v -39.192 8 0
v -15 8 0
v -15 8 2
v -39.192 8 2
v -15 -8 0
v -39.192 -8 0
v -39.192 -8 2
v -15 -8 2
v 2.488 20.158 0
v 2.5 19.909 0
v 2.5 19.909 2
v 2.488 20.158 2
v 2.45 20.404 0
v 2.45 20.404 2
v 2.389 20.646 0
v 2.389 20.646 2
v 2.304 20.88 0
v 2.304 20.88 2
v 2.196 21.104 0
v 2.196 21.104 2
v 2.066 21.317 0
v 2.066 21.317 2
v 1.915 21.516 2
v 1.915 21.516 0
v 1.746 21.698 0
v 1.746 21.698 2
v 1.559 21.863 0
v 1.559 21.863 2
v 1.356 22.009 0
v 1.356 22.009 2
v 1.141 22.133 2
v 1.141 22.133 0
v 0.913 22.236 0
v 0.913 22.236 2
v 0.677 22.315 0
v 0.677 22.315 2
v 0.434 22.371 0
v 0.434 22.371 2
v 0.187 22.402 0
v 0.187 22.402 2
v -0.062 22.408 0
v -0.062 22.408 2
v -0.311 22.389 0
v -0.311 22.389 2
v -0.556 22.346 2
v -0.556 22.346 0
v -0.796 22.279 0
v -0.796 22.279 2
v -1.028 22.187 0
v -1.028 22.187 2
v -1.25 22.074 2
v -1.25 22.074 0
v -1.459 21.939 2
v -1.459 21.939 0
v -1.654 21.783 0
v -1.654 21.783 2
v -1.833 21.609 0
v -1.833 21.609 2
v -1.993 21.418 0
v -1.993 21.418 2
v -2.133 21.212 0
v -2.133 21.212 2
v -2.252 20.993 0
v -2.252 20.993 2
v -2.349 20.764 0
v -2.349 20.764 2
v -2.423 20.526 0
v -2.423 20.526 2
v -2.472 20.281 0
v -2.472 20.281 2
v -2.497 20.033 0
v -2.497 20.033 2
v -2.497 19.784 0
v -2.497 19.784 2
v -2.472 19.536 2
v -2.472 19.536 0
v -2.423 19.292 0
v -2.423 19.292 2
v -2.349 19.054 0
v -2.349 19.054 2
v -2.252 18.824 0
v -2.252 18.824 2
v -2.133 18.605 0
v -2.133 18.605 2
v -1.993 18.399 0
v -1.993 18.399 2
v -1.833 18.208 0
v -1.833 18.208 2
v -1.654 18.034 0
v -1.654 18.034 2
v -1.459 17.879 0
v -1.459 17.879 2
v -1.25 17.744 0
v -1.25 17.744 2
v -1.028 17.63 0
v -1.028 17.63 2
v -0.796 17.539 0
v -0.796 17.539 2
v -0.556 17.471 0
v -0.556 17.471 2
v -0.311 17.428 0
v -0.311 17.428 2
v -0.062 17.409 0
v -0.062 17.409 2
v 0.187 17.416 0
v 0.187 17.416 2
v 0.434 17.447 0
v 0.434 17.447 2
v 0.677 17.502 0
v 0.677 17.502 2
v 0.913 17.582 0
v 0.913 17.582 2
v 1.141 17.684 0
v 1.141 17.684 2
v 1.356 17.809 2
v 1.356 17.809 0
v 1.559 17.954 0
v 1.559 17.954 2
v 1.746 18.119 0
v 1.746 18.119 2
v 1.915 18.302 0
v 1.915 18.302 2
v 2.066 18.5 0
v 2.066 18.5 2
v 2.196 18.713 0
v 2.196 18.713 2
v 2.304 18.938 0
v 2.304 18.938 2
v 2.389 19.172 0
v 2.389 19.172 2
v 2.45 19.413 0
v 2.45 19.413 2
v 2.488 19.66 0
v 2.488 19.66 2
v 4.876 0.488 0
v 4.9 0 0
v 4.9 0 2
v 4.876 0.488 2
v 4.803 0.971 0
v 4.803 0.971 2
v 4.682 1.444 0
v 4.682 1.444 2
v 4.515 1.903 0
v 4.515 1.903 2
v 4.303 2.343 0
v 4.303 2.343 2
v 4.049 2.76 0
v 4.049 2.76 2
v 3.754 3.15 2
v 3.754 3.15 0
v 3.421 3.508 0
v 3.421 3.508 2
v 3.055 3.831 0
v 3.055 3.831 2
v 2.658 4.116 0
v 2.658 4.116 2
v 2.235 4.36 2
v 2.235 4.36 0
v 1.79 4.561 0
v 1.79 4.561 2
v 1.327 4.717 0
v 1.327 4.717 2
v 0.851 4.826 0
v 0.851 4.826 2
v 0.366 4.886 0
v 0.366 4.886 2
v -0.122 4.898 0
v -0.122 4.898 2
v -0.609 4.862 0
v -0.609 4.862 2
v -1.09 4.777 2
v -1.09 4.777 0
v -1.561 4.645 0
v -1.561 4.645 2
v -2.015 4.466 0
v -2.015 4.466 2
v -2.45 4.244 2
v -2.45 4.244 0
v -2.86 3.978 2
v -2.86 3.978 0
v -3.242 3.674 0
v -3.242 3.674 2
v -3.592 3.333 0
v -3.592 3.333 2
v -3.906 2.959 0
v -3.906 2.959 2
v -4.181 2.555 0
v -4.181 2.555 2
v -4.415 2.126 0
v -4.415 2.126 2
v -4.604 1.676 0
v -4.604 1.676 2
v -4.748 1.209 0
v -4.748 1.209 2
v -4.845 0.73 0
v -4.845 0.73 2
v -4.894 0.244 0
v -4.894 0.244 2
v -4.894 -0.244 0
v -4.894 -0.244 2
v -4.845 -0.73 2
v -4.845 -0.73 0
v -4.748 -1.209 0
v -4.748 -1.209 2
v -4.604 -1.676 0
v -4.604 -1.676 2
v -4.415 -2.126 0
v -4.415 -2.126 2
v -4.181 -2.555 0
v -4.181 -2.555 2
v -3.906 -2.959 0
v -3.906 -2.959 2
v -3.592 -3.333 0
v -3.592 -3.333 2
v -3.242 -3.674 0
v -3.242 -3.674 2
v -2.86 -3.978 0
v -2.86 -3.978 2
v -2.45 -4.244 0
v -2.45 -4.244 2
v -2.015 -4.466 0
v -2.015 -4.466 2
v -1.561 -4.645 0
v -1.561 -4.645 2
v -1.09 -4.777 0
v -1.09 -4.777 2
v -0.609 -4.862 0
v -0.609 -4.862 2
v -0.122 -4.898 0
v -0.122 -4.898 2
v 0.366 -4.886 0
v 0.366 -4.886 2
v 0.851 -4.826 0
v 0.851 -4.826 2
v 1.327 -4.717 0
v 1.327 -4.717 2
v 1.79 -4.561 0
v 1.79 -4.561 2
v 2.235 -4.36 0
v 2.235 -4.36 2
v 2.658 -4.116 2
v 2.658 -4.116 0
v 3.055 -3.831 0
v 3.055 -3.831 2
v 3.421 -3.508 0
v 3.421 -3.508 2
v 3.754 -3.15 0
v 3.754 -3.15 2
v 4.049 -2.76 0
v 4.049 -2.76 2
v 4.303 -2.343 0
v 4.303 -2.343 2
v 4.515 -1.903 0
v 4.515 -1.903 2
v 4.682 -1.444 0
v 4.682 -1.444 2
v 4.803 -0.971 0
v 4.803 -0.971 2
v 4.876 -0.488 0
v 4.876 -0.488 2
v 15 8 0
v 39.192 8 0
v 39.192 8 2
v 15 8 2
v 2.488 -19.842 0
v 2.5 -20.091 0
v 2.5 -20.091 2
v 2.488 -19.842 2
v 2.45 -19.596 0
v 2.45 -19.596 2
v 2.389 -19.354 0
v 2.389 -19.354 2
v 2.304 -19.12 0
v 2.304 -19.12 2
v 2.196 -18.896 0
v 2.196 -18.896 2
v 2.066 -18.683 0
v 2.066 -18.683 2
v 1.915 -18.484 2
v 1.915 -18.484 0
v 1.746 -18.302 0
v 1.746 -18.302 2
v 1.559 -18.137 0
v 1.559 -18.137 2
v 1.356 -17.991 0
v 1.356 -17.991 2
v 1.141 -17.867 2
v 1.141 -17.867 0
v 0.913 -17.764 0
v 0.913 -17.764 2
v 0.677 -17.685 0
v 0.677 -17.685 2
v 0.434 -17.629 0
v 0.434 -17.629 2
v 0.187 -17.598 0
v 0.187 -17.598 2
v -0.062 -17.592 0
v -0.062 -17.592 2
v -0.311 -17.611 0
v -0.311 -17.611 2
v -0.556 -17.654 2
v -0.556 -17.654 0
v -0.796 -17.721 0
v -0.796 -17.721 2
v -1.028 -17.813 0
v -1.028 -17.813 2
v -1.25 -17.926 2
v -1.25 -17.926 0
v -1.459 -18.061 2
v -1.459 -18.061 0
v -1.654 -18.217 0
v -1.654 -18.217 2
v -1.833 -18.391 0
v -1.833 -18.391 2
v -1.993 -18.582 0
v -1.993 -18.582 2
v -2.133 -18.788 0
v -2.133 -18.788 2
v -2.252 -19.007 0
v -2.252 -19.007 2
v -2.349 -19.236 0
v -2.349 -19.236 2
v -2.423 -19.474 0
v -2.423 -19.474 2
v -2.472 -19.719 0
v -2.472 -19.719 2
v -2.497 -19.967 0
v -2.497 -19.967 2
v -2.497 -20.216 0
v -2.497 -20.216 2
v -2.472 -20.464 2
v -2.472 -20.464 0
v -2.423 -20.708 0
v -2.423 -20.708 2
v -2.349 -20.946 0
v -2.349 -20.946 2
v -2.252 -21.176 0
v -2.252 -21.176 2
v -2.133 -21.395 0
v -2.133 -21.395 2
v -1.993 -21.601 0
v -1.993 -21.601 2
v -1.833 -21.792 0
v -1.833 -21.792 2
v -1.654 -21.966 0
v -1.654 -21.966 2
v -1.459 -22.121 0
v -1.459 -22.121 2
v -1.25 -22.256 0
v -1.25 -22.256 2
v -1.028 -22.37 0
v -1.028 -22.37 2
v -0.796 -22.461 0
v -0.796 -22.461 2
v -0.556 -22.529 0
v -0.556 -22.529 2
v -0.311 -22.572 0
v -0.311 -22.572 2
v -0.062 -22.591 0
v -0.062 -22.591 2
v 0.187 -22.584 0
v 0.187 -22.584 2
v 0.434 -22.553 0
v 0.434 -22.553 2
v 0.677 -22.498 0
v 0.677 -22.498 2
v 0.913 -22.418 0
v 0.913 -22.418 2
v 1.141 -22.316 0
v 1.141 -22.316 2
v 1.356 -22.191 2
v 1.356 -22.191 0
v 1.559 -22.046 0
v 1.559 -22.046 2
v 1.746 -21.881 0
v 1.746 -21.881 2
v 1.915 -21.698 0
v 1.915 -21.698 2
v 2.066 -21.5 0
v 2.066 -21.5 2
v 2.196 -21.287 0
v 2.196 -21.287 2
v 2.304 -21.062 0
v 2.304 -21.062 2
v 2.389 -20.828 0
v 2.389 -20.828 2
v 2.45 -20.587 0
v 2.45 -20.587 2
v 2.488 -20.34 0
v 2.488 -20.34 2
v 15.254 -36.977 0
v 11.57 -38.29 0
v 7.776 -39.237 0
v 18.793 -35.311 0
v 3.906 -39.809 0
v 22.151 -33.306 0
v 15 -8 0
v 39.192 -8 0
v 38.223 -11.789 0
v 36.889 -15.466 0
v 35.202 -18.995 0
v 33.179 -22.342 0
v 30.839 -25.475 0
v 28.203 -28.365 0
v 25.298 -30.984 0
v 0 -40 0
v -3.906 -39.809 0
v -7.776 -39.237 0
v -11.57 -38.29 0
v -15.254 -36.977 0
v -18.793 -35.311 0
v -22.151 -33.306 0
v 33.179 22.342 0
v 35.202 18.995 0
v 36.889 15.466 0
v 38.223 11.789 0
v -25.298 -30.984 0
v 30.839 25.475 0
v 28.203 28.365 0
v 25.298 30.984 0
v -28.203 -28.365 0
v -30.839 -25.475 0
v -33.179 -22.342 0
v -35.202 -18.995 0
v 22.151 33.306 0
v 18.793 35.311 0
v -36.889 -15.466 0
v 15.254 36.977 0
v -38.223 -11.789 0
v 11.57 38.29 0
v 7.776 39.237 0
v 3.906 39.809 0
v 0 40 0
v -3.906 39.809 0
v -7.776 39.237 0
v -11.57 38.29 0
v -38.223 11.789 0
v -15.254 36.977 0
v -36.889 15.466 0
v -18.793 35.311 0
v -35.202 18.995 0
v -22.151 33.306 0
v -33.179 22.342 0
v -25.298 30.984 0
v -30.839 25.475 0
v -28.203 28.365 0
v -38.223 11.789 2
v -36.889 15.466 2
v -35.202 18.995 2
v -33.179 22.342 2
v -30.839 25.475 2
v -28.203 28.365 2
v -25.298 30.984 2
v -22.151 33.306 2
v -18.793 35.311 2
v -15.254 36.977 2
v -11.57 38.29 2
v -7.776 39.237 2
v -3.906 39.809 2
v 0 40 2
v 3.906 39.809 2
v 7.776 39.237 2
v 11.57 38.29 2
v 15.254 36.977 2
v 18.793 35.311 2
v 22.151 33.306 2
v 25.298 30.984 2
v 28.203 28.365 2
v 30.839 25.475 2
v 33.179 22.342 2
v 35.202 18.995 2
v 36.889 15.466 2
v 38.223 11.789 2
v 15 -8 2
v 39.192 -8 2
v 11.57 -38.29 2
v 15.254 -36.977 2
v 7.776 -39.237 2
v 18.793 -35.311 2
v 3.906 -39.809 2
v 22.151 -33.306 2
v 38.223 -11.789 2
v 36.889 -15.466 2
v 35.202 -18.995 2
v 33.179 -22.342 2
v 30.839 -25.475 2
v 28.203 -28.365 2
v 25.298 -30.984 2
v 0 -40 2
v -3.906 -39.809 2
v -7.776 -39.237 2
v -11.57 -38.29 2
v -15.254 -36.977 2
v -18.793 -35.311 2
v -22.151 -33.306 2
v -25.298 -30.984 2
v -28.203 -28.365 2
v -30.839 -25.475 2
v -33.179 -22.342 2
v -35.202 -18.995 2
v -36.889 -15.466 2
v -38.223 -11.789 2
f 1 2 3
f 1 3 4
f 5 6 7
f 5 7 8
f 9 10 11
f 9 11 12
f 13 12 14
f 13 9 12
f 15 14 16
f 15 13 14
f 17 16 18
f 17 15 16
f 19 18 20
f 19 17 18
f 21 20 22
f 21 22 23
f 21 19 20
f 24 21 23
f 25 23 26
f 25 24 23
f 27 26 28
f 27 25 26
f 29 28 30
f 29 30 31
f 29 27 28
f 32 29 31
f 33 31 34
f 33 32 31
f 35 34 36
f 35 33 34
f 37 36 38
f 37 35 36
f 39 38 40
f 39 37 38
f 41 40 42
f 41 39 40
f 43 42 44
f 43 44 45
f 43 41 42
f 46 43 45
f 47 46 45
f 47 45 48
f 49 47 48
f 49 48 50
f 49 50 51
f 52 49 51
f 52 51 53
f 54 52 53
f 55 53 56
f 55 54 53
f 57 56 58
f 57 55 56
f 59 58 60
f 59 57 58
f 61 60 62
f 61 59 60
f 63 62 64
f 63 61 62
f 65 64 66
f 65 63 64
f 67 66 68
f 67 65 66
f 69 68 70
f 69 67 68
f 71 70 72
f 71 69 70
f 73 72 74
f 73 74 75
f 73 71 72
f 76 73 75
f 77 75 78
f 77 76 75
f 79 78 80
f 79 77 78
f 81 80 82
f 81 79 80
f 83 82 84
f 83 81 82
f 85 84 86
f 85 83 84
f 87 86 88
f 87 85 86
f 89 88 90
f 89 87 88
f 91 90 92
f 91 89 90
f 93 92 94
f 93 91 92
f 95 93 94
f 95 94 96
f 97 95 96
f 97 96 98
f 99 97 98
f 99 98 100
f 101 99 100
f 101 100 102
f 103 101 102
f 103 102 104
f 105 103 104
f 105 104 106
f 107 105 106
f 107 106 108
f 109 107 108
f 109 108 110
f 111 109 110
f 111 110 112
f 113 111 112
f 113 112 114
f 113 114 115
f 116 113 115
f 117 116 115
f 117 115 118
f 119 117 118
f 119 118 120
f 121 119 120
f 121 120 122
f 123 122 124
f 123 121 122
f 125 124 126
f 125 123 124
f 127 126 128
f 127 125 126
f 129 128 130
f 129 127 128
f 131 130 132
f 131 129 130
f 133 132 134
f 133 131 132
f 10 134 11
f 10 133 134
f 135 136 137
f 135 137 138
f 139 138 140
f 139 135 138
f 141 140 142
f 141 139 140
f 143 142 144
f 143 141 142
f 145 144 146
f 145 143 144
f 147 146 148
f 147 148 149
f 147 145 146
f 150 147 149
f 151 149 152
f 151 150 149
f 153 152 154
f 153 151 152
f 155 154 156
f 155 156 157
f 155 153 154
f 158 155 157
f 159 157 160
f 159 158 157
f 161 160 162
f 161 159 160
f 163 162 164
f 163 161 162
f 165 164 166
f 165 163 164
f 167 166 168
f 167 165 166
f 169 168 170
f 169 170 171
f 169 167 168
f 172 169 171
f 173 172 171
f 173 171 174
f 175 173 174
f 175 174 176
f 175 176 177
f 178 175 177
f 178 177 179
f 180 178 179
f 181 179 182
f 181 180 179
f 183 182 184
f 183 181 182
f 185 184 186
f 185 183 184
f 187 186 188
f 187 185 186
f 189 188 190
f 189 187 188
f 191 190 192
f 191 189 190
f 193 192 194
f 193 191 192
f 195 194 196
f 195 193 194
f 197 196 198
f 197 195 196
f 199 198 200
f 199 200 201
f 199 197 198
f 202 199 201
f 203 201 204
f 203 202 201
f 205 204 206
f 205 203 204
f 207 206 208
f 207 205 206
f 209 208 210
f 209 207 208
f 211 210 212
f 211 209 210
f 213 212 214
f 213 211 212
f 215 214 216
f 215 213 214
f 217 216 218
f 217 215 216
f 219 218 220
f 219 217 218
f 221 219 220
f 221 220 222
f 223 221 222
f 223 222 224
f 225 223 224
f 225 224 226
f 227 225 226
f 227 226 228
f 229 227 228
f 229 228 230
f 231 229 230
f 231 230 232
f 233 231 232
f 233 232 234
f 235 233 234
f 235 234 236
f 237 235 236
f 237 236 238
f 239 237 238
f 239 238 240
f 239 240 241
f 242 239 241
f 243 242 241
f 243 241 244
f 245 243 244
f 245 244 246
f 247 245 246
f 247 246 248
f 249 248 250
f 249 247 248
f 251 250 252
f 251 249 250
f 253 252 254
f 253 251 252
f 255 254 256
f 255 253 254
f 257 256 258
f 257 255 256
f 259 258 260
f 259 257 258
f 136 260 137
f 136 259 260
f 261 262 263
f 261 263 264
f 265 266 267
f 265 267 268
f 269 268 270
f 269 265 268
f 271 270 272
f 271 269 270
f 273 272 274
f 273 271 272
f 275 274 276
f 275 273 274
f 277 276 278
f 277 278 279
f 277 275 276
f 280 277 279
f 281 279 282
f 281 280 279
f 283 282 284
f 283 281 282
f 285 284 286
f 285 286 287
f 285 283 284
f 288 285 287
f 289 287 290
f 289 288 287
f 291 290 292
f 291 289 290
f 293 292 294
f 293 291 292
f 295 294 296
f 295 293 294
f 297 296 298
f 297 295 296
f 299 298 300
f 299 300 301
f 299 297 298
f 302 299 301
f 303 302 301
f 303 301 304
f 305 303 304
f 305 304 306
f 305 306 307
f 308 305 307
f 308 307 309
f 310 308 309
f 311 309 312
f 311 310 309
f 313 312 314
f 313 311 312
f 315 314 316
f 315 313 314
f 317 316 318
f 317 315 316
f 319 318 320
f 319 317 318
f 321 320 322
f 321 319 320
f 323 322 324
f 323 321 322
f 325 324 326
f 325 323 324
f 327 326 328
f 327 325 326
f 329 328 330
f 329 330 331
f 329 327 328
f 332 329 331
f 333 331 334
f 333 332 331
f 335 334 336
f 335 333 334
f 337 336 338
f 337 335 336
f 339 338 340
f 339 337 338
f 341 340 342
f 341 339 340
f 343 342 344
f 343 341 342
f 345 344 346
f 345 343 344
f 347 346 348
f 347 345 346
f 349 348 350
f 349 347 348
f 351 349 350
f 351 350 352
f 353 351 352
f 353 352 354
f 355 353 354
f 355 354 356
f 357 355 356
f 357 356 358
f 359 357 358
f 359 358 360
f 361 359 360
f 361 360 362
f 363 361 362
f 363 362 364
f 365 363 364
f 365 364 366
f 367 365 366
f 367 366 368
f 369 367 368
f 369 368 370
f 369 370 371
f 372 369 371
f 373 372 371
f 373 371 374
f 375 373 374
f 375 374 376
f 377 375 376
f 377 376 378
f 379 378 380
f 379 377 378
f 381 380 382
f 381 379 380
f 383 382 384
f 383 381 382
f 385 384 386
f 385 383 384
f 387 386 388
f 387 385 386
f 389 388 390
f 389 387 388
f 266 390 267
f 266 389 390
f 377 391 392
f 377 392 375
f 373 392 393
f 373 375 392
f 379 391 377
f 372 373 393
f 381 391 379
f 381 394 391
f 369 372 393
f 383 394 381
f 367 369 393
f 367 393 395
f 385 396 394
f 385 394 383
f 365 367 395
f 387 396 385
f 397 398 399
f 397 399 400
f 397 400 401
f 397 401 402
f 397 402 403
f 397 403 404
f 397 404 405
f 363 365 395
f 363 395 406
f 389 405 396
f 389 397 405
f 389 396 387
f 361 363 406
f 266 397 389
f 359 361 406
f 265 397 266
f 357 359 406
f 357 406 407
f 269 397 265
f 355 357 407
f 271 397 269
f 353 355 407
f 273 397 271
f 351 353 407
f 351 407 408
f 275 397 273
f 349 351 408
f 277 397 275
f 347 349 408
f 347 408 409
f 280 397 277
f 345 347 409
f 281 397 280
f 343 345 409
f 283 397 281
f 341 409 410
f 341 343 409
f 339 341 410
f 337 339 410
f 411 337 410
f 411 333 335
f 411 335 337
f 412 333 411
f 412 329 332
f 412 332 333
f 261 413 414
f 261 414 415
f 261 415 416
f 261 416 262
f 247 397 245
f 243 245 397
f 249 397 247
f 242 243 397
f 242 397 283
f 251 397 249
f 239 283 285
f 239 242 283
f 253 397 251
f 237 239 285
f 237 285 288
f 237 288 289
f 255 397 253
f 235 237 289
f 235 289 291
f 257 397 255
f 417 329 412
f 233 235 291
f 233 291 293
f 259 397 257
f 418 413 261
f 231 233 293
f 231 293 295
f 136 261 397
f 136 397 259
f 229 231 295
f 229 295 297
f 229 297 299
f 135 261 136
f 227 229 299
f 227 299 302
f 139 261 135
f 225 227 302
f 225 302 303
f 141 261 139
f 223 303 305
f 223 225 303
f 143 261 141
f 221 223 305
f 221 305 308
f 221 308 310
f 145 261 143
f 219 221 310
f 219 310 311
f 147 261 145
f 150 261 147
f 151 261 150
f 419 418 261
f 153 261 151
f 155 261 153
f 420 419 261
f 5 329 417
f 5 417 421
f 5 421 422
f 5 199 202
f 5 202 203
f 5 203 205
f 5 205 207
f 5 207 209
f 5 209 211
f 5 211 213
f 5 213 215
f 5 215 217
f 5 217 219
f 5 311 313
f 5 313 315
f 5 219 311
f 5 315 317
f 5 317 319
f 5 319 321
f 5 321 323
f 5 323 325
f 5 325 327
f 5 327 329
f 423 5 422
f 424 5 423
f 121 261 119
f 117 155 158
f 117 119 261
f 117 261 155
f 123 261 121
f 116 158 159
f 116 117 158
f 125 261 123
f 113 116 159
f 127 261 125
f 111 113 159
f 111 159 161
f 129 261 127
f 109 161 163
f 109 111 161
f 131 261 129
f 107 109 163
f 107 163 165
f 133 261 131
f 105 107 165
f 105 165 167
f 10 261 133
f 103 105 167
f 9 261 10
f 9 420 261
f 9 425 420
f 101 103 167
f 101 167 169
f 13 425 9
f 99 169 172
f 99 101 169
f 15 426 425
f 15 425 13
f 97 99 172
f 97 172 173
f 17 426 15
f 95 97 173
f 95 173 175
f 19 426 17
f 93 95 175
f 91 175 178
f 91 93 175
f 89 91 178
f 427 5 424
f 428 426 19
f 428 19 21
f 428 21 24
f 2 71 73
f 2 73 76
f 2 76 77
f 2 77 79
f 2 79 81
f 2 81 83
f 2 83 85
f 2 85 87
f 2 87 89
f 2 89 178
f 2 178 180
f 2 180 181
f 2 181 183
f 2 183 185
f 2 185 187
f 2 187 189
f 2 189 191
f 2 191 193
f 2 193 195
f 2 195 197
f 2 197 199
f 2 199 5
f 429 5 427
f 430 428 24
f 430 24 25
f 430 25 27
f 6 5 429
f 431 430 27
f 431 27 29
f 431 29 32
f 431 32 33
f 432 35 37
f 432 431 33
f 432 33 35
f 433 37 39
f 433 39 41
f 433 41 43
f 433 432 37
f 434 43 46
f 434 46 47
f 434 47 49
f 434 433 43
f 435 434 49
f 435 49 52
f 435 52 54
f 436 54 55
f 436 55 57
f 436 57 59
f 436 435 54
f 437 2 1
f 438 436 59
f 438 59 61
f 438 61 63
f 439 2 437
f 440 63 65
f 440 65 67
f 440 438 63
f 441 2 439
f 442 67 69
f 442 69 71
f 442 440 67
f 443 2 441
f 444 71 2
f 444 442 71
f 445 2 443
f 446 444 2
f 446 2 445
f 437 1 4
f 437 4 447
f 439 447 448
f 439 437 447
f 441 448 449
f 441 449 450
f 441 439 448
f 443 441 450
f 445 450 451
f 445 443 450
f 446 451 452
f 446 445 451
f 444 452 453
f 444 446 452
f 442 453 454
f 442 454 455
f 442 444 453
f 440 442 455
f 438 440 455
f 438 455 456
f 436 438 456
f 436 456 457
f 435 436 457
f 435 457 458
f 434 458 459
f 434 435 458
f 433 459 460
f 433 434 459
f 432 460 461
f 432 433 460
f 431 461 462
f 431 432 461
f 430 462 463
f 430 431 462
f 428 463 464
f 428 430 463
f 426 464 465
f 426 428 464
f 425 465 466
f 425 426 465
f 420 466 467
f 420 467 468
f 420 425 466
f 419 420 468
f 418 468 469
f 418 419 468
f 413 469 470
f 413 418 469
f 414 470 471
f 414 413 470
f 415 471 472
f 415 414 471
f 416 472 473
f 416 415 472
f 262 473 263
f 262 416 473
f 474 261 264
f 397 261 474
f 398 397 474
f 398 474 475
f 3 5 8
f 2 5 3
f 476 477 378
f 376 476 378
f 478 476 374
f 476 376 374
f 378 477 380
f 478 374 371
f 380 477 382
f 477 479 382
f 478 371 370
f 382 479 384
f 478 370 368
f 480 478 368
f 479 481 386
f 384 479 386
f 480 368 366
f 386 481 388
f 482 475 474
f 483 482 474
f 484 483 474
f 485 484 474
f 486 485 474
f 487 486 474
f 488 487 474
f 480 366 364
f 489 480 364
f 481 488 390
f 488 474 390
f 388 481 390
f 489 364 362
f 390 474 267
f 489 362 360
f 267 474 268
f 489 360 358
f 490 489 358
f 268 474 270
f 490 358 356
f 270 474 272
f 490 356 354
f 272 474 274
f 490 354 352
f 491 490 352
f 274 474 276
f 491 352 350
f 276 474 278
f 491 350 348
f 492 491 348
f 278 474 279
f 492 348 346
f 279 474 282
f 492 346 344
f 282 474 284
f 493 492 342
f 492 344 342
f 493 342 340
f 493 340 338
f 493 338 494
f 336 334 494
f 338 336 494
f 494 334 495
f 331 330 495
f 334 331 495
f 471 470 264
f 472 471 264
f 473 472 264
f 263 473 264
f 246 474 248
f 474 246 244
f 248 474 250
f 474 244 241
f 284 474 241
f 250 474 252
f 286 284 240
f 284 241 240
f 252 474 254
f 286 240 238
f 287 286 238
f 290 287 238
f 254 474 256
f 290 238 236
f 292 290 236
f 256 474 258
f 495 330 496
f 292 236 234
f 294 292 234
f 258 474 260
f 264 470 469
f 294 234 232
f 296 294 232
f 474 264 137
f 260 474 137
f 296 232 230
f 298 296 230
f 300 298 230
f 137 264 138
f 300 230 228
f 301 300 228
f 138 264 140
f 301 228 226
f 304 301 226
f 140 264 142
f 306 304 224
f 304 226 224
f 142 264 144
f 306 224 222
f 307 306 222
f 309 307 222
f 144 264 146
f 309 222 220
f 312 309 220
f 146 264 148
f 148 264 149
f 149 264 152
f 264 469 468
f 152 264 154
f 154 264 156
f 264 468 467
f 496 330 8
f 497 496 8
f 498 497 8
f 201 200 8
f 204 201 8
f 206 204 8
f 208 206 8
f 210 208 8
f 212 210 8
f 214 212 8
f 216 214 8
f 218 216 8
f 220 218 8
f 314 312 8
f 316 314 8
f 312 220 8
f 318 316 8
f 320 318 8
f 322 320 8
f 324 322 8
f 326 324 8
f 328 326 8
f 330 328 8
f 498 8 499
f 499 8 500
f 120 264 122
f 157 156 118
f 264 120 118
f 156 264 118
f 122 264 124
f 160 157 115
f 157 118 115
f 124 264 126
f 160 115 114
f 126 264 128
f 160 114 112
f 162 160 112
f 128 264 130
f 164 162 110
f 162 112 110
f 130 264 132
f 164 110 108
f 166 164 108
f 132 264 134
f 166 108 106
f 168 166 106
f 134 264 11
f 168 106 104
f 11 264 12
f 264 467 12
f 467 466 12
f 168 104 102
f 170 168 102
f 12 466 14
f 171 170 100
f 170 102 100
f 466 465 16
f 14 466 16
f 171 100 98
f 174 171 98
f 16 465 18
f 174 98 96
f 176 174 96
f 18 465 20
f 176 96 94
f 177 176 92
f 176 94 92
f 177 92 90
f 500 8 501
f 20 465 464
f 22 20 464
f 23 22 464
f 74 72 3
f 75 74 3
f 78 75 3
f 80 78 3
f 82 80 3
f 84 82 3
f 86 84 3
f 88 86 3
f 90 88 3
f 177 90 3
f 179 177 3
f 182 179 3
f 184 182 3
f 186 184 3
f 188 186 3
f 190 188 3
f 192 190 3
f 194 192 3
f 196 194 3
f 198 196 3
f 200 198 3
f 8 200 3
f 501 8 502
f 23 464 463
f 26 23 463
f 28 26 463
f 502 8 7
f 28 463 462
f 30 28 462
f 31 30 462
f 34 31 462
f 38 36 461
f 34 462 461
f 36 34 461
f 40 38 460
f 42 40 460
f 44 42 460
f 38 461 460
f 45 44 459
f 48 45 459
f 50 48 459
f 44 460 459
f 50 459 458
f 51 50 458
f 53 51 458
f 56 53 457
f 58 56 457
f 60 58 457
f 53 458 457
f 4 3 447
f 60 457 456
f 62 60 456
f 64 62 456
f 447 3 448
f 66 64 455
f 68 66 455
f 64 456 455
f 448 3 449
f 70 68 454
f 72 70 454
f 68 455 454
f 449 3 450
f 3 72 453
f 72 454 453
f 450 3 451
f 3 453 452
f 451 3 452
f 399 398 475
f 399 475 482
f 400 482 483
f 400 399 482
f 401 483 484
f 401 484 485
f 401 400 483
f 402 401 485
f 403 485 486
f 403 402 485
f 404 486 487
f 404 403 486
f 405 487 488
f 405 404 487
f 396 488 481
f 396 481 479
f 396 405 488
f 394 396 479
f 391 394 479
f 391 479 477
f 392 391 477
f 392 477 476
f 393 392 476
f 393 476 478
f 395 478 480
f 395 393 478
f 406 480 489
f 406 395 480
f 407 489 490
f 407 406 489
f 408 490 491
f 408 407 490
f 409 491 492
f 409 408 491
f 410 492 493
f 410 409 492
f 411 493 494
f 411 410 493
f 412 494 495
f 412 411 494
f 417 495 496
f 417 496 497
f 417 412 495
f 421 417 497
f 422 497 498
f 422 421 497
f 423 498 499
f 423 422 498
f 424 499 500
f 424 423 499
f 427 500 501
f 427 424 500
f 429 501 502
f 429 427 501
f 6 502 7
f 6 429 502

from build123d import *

# Parameters (mm, degrees)
SKETCH1_R           = 2.5
SKETCH1_R_2         = 4.9
BOSS_EXTRUDE1_DEPTH = 2


with BuildPart() as part:
    # Sketch1 → Boss-Extrude1 (new body)
    with BuildSketch(Plane.XY):
        with BuildLine():
            Line((-15, 8), (-39.191835885, 8))
            ThreePointArc((-39.191835885, 8), (0, 40), (39.191835885, 8))
            Line((39.191835885, 8), (15, 8))
            Line((15, 8), (15, -8))
            Line((15, -8), (39.191835885, -8))
            ThreePointArc((39.191835885, -8), (0, -40), (-39.191835885, -8))
            Line((-39.191835885, -8), (-15, -8))
            Line((-15, -8), (-15, 8))
        make_face()
        with Locations((0, 19.908720325)):
            Circle(SKETCH1_R, mode=Mode.SUBTRACT)
        with Locations((0, -20.091279675)):
            Circle(SKETCH1_R, mode=Mode.SUBTRACT)
        Circle(SKETCH1_R_2, mode=Mode.SUBTRACT)
    extrude(amount=BOSS_EXTRUDE1_DEPTH)


solid = part.part
